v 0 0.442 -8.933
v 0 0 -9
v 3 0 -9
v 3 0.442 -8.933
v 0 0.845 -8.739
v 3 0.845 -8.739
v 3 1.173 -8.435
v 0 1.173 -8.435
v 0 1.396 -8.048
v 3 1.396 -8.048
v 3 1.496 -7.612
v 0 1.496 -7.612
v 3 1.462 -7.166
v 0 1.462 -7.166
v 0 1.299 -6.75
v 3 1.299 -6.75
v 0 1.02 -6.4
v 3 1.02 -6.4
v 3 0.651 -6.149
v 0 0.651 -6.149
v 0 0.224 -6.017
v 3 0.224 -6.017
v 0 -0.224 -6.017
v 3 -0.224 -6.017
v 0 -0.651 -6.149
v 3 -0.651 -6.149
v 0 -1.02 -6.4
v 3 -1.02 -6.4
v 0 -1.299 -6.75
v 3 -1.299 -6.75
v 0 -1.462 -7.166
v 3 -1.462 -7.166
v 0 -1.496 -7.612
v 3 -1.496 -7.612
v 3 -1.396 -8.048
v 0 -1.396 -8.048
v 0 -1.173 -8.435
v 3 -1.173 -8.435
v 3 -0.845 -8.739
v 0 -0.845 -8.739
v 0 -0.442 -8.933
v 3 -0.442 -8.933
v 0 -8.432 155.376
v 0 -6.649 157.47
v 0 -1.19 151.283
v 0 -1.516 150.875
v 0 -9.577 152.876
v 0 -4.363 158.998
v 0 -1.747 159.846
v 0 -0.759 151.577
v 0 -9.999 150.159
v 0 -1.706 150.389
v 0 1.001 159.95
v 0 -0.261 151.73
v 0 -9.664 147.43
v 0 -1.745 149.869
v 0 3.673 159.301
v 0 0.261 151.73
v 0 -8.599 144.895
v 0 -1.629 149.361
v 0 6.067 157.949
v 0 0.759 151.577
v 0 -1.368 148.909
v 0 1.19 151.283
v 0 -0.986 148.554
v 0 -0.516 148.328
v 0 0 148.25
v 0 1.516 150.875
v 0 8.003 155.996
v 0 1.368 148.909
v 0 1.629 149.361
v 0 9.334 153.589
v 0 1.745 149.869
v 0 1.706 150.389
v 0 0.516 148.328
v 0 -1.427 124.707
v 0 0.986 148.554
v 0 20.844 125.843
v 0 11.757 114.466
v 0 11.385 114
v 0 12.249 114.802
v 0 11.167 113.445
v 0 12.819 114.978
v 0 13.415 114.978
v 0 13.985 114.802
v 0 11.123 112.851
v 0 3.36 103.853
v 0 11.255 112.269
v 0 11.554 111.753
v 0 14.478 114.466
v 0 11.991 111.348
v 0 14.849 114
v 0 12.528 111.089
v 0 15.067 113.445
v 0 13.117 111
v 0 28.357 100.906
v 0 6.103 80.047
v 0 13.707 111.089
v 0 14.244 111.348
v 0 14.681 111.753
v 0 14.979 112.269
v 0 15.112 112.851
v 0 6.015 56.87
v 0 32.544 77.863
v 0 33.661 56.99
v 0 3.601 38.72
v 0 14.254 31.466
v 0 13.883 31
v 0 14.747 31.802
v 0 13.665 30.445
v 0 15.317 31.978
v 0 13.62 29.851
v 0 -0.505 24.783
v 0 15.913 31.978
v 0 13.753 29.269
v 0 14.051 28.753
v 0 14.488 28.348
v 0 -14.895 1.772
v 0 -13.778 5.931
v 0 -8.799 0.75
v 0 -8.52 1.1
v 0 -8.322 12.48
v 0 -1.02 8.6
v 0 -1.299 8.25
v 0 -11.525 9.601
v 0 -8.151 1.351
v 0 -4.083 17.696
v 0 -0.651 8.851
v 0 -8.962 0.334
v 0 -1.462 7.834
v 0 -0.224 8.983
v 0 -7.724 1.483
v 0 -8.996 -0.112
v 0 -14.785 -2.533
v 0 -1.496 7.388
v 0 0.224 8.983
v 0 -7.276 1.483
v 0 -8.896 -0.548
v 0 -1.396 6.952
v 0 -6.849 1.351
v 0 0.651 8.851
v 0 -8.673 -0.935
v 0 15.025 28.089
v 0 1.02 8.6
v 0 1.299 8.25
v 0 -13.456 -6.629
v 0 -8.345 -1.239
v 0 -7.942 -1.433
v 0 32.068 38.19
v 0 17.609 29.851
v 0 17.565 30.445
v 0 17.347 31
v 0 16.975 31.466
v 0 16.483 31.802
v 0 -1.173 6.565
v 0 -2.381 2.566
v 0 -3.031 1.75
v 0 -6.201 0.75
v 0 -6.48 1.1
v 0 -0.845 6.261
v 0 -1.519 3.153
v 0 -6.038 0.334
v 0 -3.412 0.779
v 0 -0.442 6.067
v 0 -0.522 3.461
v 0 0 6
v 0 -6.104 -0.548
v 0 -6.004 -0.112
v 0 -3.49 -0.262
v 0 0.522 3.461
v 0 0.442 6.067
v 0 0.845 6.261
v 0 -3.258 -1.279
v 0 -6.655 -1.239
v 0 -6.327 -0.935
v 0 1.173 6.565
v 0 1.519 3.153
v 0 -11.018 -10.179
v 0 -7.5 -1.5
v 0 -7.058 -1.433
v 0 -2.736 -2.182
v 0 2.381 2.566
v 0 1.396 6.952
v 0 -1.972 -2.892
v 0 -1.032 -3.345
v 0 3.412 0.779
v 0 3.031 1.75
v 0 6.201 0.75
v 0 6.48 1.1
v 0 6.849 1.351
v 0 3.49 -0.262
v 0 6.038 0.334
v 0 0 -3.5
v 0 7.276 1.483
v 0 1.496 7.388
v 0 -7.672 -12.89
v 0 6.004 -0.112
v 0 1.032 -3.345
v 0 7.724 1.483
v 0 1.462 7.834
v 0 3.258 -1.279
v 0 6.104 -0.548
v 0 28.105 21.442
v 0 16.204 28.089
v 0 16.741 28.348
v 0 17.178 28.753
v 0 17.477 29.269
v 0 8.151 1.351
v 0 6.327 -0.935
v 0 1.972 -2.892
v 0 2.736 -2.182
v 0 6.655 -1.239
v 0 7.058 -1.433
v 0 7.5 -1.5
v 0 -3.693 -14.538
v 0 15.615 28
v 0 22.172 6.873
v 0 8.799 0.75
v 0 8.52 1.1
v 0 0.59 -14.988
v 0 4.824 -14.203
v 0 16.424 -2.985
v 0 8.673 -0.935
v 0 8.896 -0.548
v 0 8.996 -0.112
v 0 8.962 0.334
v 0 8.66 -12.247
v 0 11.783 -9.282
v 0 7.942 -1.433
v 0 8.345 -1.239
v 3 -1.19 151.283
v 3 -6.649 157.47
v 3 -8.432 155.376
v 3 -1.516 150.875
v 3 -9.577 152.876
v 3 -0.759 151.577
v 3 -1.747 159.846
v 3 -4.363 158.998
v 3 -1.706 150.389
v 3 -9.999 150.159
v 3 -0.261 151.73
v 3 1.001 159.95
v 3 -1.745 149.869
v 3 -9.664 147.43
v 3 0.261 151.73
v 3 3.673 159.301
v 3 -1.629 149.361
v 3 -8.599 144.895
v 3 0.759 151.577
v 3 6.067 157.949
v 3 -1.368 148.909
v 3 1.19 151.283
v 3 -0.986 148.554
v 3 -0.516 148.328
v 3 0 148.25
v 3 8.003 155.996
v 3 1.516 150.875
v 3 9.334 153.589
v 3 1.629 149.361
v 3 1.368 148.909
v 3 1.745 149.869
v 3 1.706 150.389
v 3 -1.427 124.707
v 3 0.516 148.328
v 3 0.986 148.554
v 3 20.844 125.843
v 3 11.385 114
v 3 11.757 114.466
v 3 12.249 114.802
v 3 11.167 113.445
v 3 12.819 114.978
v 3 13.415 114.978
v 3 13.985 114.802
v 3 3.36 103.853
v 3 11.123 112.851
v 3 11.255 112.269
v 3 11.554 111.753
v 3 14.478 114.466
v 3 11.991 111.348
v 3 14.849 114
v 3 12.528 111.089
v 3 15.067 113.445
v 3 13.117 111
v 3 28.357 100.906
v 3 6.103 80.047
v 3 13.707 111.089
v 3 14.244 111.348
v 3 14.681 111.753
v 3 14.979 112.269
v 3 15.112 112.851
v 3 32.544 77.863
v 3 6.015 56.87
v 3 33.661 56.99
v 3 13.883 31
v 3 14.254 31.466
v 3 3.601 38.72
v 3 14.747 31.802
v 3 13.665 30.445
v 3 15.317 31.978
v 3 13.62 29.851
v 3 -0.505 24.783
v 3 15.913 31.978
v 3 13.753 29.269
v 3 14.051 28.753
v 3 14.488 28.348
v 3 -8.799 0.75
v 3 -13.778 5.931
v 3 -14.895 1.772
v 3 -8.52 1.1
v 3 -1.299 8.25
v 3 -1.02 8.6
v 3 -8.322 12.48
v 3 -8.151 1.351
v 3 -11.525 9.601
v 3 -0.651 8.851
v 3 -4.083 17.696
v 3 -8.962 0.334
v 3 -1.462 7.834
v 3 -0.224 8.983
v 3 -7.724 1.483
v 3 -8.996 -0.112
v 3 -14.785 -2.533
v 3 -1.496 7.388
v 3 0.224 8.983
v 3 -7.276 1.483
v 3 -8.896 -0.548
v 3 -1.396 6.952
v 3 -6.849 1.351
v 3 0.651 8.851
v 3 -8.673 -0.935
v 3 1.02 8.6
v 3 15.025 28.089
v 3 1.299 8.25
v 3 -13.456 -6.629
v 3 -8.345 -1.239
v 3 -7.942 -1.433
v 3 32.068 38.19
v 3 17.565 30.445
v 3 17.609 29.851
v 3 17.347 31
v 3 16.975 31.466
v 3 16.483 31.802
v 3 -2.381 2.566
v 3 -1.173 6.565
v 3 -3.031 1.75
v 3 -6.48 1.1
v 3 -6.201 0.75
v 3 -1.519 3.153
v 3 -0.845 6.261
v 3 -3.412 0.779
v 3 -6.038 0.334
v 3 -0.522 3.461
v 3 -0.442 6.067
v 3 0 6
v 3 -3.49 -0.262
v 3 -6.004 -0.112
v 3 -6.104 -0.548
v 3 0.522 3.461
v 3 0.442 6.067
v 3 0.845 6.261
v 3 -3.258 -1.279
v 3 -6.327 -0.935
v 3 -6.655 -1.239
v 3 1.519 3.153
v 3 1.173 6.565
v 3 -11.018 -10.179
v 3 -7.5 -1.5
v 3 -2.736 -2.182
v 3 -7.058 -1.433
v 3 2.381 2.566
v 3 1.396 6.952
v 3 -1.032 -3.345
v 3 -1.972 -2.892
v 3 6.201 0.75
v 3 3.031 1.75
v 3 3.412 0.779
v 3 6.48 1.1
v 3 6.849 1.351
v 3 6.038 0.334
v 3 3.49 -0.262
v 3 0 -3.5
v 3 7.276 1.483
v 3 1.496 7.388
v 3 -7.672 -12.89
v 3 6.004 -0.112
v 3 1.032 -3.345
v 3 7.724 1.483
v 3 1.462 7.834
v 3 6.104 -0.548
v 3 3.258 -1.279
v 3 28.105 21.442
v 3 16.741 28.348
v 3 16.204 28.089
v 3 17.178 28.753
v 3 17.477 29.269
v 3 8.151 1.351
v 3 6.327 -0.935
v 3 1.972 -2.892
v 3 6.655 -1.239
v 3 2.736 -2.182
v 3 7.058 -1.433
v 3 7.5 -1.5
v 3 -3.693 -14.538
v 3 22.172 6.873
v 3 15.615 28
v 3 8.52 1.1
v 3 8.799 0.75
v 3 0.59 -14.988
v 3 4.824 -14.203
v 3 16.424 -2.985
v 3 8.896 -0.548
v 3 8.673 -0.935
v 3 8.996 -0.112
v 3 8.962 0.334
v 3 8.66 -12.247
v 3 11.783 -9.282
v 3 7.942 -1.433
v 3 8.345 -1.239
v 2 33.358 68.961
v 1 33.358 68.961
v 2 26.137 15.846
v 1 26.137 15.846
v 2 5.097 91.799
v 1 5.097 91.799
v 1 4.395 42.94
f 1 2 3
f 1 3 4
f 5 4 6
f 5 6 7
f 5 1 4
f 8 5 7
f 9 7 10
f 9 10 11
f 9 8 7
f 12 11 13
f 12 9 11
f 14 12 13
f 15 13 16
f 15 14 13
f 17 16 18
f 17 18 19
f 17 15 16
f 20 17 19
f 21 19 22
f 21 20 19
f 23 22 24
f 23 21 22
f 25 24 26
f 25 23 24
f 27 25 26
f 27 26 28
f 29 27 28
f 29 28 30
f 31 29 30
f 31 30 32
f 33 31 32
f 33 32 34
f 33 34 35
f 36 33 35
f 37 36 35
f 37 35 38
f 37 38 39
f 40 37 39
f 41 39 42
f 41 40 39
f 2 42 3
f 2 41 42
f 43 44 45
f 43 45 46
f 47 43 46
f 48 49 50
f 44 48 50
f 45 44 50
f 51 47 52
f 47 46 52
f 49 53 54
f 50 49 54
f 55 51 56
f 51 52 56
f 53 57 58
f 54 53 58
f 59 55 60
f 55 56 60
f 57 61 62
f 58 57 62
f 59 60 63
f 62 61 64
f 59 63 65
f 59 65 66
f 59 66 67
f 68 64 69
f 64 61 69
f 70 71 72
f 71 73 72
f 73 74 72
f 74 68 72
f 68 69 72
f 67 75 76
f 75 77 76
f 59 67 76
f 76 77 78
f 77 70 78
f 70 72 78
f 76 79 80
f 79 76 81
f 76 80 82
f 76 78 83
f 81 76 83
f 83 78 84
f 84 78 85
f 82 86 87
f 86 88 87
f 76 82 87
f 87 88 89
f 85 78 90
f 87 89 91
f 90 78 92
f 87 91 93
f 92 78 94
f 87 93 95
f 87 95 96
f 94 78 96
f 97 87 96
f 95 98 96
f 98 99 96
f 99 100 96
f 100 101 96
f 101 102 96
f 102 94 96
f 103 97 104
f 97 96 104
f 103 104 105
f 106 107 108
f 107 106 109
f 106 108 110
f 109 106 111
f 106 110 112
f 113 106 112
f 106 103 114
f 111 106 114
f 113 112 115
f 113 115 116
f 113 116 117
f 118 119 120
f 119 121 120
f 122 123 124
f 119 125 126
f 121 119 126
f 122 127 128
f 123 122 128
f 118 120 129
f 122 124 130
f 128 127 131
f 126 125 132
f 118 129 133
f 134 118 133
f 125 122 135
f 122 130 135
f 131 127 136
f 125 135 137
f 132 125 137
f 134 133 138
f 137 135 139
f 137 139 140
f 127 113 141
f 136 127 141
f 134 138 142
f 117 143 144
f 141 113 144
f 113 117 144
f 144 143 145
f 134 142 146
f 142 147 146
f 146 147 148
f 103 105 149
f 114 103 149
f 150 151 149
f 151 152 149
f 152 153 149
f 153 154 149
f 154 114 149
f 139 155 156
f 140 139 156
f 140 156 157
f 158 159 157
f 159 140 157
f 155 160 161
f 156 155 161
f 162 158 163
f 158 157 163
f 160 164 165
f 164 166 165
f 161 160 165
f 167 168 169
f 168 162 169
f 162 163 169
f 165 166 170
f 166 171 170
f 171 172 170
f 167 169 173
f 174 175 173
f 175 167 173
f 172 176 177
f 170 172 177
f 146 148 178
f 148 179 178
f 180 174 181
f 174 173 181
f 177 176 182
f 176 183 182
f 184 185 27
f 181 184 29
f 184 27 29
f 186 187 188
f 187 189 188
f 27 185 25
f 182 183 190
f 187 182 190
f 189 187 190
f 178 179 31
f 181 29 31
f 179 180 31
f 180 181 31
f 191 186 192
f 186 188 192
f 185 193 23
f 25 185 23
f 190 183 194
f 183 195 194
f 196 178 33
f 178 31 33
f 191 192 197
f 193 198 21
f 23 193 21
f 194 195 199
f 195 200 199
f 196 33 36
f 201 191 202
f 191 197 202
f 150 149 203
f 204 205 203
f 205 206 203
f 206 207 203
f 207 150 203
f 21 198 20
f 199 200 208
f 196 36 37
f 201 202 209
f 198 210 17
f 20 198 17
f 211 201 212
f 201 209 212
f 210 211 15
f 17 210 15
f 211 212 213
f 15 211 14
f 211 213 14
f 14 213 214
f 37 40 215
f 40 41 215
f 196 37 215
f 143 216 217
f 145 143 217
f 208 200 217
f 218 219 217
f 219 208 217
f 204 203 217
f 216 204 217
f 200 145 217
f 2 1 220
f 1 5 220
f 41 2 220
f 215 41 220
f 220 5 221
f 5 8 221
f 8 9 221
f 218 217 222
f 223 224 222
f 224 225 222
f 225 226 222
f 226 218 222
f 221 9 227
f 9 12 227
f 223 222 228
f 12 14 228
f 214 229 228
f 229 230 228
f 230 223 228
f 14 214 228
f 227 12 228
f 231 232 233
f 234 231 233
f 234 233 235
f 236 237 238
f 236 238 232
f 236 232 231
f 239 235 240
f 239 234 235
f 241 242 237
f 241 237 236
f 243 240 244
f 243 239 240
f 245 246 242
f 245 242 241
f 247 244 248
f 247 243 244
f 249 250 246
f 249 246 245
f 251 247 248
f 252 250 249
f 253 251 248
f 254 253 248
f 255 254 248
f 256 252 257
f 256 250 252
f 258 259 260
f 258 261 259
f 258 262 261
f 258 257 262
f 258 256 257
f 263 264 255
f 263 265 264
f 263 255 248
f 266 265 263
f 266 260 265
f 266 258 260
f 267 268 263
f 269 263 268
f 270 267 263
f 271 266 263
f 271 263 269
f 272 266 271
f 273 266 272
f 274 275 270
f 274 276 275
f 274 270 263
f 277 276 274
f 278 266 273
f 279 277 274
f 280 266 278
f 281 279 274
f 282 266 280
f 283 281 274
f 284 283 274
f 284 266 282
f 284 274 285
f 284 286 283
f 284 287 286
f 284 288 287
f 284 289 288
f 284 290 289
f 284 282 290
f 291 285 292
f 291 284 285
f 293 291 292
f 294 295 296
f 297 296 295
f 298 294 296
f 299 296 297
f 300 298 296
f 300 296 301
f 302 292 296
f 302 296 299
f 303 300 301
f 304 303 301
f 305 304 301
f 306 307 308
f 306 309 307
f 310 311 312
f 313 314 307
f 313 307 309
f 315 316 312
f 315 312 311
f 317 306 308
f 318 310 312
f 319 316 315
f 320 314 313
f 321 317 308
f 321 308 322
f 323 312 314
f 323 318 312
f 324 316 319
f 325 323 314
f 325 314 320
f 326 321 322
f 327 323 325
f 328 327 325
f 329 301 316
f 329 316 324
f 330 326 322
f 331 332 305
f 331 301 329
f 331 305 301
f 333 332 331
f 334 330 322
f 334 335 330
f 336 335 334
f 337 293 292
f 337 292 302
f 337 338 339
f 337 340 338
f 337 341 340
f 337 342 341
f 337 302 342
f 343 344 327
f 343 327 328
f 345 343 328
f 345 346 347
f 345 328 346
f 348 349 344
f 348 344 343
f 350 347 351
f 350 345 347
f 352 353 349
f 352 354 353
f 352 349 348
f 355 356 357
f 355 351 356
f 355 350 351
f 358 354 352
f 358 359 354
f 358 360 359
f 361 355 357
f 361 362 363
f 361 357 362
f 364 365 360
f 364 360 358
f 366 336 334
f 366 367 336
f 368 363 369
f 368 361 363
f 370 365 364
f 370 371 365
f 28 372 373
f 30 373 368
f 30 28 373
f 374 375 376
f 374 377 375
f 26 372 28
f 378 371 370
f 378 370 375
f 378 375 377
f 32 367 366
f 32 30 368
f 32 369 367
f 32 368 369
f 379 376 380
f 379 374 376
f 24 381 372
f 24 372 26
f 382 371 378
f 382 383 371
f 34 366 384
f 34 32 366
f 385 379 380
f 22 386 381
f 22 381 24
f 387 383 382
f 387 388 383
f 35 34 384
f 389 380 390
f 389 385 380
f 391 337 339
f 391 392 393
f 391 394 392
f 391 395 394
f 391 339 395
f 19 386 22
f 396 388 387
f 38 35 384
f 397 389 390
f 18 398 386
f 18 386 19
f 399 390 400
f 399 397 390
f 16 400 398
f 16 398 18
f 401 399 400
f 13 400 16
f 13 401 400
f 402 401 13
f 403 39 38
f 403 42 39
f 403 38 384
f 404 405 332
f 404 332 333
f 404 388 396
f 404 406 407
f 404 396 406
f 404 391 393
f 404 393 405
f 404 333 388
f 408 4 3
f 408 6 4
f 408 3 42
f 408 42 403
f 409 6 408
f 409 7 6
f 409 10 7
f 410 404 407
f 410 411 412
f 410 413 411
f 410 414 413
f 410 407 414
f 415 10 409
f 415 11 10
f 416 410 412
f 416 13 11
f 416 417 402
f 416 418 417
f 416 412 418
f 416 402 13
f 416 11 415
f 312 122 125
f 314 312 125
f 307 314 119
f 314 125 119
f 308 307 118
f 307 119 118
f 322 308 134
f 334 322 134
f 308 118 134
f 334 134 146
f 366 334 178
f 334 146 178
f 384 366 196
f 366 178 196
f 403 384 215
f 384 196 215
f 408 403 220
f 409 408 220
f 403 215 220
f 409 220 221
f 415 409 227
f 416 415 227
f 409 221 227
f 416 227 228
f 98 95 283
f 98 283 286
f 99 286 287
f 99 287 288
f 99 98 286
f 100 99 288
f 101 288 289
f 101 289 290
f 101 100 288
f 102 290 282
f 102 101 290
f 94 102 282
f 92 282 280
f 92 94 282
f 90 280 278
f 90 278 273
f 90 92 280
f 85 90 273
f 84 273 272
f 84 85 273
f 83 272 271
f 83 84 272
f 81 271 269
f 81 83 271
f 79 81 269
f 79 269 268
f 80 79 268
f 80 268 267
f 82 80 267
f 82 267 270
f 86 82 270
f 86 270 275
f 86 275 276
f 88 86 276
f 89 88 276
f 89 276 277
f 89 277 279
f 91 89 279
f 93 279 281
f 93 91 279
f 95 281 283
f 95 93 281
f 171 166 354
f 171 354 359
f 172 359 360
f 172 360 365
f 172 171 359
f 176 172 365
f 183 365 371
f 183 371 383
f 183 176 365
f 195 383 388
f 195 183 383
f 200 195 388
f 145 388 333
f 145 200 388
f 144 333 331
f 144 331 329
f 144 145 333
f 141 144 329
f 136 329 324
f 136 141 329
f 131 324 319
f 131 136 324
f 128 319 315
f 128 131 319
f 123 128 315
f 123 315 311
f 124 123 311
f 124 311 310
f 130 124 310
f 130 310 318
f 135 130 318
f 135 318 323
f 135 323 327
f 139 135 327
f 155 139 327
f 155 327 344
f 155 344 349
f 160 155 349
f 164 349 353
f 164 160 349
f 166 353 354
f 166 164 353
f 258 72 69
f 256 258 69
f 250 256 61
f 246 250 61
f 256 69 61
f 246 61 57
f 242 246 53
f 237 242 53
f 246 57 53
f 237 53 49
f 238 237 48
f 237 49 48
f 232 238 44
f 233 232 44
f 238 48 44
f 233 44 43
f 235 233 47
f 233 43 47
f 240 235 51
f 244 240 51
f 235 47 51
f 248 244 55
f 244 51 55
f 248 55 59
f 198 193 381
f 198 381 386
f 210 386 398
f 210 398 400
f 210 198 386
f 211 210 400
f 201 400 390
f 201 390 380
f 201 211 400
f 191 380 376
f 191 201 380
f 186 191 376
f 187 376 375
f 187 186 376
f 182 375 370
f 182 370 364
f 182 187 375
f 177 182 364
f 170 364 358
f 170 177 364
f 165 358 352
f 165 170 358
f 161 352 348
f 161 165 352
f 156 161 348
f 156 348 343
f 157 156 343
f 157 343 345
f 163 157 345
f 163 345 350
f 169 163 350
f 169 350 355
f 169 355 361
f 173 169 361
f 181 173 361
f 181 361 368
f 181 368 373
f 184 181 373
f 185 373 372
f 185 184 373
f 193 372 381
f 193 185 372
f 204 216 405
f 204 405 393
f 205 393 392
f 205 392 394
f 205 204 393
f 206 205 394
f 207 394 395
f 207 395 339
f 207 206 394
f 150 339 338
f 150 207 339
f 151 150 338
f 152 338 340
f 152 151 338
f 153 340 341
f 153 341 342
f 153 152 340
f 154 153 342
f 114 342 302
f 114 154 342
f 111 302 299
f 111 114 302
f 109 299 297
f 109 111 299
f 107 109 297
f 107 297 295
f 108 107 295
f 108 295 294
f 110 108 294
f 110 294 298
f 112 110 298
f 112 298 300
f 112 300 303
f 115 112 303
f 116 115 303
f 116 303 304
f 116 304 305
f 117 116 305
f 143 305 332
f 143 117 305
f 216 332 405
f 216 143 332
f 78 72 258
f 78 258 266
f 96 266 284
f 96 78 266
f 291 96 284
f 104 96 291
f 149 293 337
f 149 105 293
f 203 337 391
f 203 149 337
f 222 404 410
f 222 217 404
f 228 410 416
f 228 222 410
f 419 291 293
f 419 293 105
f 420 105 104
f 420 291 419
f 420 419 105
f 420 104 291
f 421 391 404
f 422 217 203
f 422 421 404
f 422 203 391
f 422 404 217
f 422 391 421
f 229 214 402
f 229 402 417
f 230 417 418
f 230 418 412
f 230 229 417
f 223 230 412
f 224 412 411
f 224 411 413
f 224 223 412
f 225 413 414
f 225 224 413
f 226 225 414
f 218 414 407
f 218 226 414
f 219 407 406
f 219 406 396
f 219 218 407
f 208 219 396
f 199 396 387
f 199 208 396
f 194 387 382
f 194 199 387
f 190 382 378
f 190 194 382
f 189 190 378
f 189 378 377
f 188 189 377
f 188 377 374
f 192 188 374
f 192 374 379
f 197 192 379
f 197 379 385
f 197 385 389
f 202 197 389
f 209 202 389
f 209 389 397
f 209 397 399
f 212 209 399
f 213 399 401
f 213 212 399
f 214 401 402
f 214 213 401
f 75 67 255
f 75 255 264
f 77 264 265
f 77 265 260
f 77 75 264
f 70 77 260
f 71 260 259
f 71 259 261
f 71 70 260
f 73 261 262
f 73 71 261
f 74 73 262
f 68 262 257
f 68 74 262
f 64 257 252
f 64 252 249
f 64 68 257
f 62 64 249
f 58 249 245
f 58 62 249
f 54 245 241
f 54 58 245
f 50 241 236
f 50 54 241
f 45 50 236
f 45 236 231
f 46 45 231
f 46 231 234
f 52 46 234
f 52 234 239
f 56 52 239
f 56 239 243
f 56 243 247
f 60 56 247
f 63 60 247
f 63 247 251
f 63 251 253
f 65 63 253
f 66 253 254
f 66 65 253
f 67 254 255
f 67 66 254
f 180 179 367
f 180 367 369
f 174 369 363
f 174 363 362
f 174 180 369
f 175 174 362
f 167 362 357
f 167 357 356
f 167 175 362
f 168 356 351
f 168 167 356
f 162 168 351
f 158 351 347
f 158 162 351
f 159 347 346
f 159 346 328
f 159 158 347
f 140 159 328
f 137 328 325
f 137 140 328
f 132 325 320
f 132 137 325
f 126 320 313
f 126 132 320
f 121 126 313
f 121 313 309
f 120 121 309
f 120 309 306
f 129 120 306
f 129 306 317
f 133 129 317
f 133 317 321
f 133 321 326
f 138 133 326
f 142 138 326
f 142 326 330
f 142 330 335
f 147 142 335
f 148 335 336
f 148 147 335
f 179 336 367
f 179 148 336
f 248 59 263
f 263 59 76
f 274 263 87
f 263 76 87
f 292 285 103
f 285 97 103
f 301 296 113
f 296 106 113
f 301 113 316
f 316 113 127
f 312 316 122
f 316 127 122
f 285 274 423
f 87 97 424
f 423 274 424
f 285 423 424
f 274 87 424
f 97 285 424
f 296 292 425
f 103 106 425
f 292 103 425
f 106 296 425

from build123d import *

# Parameters (mm, degrees)
CROQUIS1_R              = 1.75
CROQUIS1_R_2            = 3.5
CROQUIS1_R_3            = 2
CROQUIS1_R_4            = 1.5
SALIENTE_EXTRUIR1_DEPTH = 3


with BuildPart() as part:
    # Croquis1 → Saliente-Extruir1 (new body)
    with BuildSketch(Plane(origin=(0, 0, 0), x_dir=(0, 0, -1), z_dir=(1, 0, 0))):
        with BuildLine():
            ThreePointArc((-12.479760771, -8.321993217), (10.178991806, -11.017627957), (9.281950646, 11.783267467))
            add(Edge.make_bspline(
                [(-153.589400871, 9.333606023), (-52.027464553, 57.017454048), (-3.028685523, 21.666117386), (9.281950646, 11.783267467)],
                knots=[0, 0, 0, 0, 1, 1, 1, 1], degree=3))
            ThreePointArc((-153.589400871, 9.333606023), (-158.998047864, -4.362927301), (-144.894564169, -8.598518767))
            add(Edge.make_bspline(
                [(-144.894564169, -8.598518767), (-94.399563679, 13.089335746), (-29.021790265, 9.608207487), (-12.479760771, -8.321993217)],
                knots=[0, 0, 0, 0, 1, 1, 1, 1], degree=3))
        make_face()
        with Locations((-150, 0)):
            Circle(CROQUIS1_R, mode=Mode.SUBTRACT)
        Circle(CROQUIS1_R_2, mode=Mode.SUBTRACT)
        with Locations((-113, 13.11718)):
            Circle(CROQUIS1_R_3, mode=Mode.SUBTRACT)
        with Locations((-30, 15.614781046)):
            Circle(CROQUIS1_R_3, mode=Mode.SUBTRACT)
        with Locations((-7.5, 0)):
            Circle(CROQUIS1_R_4, mode=Mode.SUBTRACT)
        with Locations((0, -7.5)):
            Circle(CROQUIS1_R_4, mode=Mode.SUBTRACT)
        with Locations((0, 7.5)):
            Circle(CROQUIS1_R_4, mode=Mode.SUBTRACT)
        with Locations((7.5, 0)):
            Circle(CROQUIS1_R_4, mode=Mode.SUBTRACT)
    extrude(amount=SALIENTE_EXTRUIR1_DEPTH)


solid = part.part
